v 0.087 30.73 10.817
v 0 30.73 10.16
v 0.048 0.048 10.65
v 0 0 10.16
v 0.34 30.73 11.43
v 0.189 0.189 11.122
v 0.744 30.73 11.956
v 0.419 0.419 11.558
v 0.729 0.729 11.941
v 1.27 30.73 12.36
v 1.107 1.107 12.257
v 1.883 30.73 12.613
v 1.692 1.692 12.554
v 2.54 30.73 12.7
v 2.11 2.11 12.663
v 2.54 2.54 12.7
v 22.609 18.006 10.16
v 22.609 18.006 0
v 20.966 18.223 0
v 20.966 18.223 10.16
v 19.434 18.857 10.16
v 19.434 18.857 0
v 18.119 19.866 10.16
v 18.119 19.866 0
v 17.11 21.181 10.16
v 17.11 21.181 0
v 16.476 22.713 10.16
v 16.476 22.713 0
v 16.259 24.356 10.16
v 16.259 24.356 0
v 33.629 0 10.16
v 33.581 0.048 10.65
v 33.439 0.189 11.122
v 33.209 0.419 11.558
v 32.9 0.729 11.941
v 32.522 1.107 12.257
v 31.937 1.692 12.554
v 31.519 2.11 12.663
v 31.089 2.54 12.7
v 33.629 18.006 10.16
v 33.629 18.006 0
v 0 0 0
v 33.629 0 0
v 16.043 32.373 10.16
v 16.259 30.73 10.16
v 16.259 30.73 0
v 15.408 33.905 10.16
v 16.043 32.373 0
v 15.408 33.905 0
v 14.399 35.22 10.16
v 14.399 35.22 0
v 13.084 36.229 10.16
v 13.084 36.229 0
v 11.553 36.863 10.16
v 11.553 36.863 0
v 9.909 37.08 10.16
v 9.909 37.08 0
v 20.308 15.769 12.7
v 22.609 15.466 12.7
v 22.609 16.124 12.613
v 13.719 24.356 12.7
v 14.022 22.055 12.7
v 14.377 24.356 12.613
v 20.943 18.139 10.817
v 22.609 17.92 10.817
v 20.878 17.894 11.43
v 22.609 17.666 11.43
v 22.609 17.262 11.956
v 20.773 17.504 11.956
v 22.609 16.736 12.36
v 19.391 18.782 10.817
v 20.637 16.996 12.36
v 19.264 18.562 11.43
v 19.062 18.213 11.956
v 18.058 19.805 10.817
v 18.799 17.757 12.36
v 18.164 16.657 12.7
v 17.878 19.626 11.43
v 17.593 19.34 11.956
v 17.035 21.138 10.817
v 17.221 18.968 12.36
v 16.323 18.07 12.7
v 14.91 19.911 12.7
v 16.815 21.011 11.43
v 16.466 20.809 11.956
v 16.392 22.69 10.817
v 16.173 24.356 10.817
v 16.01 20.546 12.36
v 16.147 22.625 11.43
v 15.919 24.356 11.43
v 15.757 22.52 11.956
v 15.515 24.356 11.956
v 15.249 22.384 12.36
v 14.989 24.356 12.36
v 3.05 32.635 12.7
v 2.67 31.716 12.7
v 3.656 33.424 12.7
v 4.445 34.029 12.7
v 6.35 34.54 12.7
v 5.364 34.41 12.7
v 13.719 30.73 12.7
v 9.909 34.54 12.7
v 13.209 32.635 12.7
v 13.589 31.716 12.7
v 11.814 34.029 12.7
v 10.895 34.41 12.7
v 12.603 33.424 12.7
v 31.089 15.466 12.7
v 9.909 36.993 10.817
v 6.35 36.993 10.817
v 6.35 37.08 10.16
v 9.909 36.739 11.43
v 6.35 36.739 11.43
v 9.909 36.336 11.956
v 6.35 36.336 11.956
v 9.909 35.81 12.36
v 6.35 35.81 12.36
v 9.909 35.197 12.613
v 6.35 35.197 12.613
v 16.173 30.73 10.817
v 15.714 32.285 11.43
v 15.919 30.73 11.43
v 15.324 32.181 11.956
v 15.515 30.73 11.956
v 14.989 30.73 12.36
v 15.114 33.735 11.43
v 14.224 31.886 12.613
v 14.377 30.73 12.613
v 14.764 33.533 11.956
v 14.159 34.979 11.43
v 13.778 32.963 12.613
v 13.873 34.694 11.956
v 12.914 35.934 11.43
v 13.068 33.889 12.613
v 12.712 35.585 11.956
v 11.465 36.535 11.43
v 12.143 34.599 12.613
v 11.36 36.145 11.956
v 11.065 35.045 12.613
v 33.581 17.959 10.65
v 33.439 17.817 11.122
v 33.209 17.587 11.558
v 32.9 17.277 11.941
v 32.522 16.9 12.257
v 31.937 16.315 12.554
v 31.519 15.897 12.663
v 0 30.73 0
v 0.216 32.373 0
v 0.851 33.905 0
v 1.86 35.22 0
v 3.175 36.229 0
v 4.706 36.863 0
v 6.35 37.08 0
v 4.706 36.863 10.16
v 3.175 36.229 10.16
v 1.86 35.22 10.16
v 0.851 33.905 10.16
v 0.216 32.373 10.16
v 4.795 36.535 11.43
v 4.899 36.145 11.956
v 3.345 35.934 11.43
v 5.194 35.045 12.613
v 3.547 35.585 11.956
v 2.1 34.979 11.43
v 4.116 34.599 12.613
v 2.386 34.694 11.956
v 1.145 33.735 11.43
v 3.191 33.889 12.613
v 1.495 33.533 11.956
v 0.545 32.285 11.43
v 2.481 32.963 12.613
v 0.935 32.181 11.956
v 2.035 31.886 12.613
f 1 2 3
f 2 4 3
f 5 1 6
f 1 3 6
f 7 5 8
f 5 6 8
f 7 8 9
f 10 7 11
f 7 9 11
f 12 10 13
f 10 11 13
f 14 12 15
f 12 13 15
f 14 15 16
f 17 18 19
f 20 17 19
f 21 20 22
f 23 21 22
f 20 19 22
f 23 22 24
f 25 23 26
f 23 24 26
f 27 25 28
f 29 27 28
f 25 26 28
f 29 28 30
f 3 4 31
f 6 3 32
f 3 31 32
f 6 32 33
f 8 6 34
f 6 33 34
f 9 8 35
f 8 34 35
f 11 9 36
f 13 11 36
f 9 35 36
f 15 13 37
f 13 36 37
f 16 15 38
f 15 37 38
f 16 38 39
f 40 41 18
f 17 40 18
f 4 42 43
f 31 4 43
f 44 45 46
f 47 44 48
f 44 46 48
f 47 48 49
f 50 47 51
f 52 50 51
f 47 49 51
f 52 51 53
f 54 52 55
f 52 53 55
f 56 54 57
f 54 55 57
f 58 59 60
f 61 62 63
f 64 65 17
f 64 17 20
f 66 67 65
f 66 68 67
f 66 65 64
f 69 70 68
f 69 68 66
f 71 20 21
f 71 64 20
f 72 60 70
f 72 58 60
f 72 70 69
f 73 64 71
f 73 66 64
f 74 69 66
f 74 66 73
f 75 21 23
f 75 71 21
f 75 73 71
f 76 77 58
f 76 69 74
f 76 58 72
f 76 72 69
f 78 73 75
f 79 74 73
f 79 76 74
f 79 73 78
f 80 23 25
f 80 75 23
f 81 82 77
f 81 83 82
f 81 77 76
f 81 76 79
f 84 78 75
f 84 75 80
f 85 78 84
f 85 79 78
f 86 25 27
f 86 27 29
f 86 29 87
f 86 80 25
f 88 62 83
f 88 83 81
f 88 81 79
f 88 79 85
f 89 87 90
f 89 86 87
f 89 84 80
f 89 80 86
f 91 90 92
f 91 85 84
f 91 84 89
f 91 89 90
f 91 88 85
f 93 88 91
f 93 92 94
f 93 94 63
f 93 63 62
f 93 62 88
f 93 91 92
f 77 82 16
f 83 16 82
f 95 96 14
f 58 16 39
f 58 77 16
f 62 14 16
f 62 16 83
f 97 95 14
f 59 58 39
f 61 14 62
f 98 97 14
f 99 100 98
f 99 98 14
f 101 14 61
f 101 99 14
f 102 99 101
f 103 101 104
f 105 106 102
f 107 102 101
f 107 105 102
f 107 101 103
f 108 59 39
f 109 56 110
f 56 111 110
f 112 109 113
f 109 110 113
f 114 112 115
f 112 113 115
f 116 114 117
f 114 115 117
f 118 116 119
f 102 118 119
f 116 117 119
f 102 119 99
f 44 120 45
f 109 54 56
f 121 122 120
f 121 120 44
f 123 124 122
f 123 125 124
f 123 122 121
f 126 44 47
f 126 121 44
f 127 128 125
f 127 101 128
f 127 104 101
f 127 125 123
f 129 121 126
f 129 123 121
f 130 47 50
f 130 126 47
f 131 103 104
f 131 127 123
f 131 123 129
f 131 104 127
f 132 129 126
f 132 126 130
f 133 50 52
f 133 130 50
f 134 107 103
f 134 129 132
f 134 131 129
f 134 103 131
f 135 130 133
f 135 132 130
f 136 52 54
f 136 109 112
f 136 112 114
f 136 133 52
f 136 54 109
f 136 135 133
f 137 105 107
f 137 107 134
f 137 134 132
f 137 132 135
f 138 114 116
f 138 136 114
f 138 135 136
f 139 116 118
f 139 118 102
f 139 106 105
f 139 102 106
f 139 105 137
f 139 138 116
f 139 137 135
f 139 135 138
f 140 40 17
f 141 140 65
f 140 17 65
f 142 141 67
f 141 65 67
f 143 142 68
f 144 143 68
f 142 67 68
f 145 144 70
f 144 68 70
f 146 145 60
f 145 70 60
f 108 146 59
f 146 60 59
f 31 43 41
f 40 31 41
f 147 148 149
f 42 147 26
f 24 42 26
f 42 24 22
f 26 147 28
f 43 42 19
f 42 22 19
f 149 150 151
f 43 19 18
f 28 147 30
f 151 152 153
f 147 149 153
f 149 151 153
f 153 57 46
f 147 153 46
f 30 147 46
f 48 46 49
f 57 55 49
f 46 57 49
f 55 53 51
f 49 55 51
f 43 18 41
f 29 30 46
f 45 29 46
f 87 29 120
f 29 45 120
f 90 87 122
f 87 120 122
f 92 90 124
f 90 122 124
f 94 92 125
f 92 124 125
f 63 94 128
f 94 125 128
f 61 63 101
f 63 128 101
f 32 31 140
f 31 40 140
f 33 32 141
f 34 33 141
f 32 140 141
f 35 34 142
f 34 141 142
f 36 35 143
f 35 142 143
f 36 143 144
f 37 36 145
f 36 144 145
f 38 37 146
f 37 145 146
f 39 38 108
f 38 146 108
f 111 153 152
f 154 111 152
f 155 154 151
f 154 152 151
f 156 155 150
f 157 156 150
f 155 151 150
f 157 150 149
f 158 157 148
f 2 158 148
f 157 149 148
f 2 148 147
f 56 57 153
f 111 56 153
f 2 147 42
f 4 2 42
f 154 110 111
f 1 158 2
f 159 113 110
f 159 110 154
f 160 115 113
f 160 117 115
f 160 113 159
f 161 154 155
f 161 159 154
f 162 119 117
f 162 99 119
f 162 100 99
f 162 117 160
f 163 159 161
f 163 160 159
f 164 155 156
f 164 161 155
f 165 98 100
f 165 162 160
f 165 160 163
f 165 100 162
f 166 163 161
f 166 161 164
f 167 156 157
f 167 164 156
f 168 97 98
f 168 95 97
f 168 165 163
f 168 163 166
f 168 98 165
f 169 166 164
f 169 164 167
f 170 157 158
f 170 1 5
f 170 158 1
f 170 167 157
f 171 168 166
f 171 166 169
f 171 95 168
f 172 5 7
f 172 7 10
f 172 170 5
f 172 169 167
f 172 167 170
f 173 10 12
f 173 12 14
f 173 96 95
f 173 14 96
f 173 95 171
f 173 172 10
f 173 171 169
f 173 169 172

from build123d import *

# Parameters (mm, degrees)
F1_DEPTH = 12.7
F2_R     = 2.54


with BuildPart() as f1:
    # F0 (on Top) → F1 (new body)
    with BuildSketch(Plane.XY):
        with BuildLine():
            Line((0, 30.729745), (0, 0))
            Line((0, 0), (33.628508, 0))
            Line((33.628508, 0), (33.628508, 18.006372))
            Line((33.628508, 18.006372), (22.609146, 18.006372))
            ThreePointArc((22.609146, 18.006372), (18.119018, 19.866244), (16.259146, 24.356372))
            Line((16.259146, 24.356372), (16.259146, 30.729745))
            ThreePointArc((16.259146, 30.729745), (14.399274, 35.219873), (9.909146, 37.079745))
            Line((9.909146, 37.079745), (6.35, 37.079745))
            ThreePointArc((6.35, 37.079745), (1.859872, 35.219873), (0, 30.729745))
        make_face()
    extrude(amount=F1_DEPTH)

    # F2
    f2_edges = [f1.edges().sort_by_distance(p)[0] for p in [
        (1.859872, 35.219873, 12.7),
        (8.129573, 37.079745, 12.7),
        (14.399274, 35.219873, 12.7),
        (16.259146, 27.543059, 12.7),
        (18.119018, 19.866244, 12.7),
        (28.118827, 18.006372, 12.7),
        (33.628508, 9.003186, 12.7),
        (16.814254, 0, 12.7),
        (0, 15.364872, 12.7),
    ]]
    fillet(f2_edges, radius=F2_R)


solid = f1.part
